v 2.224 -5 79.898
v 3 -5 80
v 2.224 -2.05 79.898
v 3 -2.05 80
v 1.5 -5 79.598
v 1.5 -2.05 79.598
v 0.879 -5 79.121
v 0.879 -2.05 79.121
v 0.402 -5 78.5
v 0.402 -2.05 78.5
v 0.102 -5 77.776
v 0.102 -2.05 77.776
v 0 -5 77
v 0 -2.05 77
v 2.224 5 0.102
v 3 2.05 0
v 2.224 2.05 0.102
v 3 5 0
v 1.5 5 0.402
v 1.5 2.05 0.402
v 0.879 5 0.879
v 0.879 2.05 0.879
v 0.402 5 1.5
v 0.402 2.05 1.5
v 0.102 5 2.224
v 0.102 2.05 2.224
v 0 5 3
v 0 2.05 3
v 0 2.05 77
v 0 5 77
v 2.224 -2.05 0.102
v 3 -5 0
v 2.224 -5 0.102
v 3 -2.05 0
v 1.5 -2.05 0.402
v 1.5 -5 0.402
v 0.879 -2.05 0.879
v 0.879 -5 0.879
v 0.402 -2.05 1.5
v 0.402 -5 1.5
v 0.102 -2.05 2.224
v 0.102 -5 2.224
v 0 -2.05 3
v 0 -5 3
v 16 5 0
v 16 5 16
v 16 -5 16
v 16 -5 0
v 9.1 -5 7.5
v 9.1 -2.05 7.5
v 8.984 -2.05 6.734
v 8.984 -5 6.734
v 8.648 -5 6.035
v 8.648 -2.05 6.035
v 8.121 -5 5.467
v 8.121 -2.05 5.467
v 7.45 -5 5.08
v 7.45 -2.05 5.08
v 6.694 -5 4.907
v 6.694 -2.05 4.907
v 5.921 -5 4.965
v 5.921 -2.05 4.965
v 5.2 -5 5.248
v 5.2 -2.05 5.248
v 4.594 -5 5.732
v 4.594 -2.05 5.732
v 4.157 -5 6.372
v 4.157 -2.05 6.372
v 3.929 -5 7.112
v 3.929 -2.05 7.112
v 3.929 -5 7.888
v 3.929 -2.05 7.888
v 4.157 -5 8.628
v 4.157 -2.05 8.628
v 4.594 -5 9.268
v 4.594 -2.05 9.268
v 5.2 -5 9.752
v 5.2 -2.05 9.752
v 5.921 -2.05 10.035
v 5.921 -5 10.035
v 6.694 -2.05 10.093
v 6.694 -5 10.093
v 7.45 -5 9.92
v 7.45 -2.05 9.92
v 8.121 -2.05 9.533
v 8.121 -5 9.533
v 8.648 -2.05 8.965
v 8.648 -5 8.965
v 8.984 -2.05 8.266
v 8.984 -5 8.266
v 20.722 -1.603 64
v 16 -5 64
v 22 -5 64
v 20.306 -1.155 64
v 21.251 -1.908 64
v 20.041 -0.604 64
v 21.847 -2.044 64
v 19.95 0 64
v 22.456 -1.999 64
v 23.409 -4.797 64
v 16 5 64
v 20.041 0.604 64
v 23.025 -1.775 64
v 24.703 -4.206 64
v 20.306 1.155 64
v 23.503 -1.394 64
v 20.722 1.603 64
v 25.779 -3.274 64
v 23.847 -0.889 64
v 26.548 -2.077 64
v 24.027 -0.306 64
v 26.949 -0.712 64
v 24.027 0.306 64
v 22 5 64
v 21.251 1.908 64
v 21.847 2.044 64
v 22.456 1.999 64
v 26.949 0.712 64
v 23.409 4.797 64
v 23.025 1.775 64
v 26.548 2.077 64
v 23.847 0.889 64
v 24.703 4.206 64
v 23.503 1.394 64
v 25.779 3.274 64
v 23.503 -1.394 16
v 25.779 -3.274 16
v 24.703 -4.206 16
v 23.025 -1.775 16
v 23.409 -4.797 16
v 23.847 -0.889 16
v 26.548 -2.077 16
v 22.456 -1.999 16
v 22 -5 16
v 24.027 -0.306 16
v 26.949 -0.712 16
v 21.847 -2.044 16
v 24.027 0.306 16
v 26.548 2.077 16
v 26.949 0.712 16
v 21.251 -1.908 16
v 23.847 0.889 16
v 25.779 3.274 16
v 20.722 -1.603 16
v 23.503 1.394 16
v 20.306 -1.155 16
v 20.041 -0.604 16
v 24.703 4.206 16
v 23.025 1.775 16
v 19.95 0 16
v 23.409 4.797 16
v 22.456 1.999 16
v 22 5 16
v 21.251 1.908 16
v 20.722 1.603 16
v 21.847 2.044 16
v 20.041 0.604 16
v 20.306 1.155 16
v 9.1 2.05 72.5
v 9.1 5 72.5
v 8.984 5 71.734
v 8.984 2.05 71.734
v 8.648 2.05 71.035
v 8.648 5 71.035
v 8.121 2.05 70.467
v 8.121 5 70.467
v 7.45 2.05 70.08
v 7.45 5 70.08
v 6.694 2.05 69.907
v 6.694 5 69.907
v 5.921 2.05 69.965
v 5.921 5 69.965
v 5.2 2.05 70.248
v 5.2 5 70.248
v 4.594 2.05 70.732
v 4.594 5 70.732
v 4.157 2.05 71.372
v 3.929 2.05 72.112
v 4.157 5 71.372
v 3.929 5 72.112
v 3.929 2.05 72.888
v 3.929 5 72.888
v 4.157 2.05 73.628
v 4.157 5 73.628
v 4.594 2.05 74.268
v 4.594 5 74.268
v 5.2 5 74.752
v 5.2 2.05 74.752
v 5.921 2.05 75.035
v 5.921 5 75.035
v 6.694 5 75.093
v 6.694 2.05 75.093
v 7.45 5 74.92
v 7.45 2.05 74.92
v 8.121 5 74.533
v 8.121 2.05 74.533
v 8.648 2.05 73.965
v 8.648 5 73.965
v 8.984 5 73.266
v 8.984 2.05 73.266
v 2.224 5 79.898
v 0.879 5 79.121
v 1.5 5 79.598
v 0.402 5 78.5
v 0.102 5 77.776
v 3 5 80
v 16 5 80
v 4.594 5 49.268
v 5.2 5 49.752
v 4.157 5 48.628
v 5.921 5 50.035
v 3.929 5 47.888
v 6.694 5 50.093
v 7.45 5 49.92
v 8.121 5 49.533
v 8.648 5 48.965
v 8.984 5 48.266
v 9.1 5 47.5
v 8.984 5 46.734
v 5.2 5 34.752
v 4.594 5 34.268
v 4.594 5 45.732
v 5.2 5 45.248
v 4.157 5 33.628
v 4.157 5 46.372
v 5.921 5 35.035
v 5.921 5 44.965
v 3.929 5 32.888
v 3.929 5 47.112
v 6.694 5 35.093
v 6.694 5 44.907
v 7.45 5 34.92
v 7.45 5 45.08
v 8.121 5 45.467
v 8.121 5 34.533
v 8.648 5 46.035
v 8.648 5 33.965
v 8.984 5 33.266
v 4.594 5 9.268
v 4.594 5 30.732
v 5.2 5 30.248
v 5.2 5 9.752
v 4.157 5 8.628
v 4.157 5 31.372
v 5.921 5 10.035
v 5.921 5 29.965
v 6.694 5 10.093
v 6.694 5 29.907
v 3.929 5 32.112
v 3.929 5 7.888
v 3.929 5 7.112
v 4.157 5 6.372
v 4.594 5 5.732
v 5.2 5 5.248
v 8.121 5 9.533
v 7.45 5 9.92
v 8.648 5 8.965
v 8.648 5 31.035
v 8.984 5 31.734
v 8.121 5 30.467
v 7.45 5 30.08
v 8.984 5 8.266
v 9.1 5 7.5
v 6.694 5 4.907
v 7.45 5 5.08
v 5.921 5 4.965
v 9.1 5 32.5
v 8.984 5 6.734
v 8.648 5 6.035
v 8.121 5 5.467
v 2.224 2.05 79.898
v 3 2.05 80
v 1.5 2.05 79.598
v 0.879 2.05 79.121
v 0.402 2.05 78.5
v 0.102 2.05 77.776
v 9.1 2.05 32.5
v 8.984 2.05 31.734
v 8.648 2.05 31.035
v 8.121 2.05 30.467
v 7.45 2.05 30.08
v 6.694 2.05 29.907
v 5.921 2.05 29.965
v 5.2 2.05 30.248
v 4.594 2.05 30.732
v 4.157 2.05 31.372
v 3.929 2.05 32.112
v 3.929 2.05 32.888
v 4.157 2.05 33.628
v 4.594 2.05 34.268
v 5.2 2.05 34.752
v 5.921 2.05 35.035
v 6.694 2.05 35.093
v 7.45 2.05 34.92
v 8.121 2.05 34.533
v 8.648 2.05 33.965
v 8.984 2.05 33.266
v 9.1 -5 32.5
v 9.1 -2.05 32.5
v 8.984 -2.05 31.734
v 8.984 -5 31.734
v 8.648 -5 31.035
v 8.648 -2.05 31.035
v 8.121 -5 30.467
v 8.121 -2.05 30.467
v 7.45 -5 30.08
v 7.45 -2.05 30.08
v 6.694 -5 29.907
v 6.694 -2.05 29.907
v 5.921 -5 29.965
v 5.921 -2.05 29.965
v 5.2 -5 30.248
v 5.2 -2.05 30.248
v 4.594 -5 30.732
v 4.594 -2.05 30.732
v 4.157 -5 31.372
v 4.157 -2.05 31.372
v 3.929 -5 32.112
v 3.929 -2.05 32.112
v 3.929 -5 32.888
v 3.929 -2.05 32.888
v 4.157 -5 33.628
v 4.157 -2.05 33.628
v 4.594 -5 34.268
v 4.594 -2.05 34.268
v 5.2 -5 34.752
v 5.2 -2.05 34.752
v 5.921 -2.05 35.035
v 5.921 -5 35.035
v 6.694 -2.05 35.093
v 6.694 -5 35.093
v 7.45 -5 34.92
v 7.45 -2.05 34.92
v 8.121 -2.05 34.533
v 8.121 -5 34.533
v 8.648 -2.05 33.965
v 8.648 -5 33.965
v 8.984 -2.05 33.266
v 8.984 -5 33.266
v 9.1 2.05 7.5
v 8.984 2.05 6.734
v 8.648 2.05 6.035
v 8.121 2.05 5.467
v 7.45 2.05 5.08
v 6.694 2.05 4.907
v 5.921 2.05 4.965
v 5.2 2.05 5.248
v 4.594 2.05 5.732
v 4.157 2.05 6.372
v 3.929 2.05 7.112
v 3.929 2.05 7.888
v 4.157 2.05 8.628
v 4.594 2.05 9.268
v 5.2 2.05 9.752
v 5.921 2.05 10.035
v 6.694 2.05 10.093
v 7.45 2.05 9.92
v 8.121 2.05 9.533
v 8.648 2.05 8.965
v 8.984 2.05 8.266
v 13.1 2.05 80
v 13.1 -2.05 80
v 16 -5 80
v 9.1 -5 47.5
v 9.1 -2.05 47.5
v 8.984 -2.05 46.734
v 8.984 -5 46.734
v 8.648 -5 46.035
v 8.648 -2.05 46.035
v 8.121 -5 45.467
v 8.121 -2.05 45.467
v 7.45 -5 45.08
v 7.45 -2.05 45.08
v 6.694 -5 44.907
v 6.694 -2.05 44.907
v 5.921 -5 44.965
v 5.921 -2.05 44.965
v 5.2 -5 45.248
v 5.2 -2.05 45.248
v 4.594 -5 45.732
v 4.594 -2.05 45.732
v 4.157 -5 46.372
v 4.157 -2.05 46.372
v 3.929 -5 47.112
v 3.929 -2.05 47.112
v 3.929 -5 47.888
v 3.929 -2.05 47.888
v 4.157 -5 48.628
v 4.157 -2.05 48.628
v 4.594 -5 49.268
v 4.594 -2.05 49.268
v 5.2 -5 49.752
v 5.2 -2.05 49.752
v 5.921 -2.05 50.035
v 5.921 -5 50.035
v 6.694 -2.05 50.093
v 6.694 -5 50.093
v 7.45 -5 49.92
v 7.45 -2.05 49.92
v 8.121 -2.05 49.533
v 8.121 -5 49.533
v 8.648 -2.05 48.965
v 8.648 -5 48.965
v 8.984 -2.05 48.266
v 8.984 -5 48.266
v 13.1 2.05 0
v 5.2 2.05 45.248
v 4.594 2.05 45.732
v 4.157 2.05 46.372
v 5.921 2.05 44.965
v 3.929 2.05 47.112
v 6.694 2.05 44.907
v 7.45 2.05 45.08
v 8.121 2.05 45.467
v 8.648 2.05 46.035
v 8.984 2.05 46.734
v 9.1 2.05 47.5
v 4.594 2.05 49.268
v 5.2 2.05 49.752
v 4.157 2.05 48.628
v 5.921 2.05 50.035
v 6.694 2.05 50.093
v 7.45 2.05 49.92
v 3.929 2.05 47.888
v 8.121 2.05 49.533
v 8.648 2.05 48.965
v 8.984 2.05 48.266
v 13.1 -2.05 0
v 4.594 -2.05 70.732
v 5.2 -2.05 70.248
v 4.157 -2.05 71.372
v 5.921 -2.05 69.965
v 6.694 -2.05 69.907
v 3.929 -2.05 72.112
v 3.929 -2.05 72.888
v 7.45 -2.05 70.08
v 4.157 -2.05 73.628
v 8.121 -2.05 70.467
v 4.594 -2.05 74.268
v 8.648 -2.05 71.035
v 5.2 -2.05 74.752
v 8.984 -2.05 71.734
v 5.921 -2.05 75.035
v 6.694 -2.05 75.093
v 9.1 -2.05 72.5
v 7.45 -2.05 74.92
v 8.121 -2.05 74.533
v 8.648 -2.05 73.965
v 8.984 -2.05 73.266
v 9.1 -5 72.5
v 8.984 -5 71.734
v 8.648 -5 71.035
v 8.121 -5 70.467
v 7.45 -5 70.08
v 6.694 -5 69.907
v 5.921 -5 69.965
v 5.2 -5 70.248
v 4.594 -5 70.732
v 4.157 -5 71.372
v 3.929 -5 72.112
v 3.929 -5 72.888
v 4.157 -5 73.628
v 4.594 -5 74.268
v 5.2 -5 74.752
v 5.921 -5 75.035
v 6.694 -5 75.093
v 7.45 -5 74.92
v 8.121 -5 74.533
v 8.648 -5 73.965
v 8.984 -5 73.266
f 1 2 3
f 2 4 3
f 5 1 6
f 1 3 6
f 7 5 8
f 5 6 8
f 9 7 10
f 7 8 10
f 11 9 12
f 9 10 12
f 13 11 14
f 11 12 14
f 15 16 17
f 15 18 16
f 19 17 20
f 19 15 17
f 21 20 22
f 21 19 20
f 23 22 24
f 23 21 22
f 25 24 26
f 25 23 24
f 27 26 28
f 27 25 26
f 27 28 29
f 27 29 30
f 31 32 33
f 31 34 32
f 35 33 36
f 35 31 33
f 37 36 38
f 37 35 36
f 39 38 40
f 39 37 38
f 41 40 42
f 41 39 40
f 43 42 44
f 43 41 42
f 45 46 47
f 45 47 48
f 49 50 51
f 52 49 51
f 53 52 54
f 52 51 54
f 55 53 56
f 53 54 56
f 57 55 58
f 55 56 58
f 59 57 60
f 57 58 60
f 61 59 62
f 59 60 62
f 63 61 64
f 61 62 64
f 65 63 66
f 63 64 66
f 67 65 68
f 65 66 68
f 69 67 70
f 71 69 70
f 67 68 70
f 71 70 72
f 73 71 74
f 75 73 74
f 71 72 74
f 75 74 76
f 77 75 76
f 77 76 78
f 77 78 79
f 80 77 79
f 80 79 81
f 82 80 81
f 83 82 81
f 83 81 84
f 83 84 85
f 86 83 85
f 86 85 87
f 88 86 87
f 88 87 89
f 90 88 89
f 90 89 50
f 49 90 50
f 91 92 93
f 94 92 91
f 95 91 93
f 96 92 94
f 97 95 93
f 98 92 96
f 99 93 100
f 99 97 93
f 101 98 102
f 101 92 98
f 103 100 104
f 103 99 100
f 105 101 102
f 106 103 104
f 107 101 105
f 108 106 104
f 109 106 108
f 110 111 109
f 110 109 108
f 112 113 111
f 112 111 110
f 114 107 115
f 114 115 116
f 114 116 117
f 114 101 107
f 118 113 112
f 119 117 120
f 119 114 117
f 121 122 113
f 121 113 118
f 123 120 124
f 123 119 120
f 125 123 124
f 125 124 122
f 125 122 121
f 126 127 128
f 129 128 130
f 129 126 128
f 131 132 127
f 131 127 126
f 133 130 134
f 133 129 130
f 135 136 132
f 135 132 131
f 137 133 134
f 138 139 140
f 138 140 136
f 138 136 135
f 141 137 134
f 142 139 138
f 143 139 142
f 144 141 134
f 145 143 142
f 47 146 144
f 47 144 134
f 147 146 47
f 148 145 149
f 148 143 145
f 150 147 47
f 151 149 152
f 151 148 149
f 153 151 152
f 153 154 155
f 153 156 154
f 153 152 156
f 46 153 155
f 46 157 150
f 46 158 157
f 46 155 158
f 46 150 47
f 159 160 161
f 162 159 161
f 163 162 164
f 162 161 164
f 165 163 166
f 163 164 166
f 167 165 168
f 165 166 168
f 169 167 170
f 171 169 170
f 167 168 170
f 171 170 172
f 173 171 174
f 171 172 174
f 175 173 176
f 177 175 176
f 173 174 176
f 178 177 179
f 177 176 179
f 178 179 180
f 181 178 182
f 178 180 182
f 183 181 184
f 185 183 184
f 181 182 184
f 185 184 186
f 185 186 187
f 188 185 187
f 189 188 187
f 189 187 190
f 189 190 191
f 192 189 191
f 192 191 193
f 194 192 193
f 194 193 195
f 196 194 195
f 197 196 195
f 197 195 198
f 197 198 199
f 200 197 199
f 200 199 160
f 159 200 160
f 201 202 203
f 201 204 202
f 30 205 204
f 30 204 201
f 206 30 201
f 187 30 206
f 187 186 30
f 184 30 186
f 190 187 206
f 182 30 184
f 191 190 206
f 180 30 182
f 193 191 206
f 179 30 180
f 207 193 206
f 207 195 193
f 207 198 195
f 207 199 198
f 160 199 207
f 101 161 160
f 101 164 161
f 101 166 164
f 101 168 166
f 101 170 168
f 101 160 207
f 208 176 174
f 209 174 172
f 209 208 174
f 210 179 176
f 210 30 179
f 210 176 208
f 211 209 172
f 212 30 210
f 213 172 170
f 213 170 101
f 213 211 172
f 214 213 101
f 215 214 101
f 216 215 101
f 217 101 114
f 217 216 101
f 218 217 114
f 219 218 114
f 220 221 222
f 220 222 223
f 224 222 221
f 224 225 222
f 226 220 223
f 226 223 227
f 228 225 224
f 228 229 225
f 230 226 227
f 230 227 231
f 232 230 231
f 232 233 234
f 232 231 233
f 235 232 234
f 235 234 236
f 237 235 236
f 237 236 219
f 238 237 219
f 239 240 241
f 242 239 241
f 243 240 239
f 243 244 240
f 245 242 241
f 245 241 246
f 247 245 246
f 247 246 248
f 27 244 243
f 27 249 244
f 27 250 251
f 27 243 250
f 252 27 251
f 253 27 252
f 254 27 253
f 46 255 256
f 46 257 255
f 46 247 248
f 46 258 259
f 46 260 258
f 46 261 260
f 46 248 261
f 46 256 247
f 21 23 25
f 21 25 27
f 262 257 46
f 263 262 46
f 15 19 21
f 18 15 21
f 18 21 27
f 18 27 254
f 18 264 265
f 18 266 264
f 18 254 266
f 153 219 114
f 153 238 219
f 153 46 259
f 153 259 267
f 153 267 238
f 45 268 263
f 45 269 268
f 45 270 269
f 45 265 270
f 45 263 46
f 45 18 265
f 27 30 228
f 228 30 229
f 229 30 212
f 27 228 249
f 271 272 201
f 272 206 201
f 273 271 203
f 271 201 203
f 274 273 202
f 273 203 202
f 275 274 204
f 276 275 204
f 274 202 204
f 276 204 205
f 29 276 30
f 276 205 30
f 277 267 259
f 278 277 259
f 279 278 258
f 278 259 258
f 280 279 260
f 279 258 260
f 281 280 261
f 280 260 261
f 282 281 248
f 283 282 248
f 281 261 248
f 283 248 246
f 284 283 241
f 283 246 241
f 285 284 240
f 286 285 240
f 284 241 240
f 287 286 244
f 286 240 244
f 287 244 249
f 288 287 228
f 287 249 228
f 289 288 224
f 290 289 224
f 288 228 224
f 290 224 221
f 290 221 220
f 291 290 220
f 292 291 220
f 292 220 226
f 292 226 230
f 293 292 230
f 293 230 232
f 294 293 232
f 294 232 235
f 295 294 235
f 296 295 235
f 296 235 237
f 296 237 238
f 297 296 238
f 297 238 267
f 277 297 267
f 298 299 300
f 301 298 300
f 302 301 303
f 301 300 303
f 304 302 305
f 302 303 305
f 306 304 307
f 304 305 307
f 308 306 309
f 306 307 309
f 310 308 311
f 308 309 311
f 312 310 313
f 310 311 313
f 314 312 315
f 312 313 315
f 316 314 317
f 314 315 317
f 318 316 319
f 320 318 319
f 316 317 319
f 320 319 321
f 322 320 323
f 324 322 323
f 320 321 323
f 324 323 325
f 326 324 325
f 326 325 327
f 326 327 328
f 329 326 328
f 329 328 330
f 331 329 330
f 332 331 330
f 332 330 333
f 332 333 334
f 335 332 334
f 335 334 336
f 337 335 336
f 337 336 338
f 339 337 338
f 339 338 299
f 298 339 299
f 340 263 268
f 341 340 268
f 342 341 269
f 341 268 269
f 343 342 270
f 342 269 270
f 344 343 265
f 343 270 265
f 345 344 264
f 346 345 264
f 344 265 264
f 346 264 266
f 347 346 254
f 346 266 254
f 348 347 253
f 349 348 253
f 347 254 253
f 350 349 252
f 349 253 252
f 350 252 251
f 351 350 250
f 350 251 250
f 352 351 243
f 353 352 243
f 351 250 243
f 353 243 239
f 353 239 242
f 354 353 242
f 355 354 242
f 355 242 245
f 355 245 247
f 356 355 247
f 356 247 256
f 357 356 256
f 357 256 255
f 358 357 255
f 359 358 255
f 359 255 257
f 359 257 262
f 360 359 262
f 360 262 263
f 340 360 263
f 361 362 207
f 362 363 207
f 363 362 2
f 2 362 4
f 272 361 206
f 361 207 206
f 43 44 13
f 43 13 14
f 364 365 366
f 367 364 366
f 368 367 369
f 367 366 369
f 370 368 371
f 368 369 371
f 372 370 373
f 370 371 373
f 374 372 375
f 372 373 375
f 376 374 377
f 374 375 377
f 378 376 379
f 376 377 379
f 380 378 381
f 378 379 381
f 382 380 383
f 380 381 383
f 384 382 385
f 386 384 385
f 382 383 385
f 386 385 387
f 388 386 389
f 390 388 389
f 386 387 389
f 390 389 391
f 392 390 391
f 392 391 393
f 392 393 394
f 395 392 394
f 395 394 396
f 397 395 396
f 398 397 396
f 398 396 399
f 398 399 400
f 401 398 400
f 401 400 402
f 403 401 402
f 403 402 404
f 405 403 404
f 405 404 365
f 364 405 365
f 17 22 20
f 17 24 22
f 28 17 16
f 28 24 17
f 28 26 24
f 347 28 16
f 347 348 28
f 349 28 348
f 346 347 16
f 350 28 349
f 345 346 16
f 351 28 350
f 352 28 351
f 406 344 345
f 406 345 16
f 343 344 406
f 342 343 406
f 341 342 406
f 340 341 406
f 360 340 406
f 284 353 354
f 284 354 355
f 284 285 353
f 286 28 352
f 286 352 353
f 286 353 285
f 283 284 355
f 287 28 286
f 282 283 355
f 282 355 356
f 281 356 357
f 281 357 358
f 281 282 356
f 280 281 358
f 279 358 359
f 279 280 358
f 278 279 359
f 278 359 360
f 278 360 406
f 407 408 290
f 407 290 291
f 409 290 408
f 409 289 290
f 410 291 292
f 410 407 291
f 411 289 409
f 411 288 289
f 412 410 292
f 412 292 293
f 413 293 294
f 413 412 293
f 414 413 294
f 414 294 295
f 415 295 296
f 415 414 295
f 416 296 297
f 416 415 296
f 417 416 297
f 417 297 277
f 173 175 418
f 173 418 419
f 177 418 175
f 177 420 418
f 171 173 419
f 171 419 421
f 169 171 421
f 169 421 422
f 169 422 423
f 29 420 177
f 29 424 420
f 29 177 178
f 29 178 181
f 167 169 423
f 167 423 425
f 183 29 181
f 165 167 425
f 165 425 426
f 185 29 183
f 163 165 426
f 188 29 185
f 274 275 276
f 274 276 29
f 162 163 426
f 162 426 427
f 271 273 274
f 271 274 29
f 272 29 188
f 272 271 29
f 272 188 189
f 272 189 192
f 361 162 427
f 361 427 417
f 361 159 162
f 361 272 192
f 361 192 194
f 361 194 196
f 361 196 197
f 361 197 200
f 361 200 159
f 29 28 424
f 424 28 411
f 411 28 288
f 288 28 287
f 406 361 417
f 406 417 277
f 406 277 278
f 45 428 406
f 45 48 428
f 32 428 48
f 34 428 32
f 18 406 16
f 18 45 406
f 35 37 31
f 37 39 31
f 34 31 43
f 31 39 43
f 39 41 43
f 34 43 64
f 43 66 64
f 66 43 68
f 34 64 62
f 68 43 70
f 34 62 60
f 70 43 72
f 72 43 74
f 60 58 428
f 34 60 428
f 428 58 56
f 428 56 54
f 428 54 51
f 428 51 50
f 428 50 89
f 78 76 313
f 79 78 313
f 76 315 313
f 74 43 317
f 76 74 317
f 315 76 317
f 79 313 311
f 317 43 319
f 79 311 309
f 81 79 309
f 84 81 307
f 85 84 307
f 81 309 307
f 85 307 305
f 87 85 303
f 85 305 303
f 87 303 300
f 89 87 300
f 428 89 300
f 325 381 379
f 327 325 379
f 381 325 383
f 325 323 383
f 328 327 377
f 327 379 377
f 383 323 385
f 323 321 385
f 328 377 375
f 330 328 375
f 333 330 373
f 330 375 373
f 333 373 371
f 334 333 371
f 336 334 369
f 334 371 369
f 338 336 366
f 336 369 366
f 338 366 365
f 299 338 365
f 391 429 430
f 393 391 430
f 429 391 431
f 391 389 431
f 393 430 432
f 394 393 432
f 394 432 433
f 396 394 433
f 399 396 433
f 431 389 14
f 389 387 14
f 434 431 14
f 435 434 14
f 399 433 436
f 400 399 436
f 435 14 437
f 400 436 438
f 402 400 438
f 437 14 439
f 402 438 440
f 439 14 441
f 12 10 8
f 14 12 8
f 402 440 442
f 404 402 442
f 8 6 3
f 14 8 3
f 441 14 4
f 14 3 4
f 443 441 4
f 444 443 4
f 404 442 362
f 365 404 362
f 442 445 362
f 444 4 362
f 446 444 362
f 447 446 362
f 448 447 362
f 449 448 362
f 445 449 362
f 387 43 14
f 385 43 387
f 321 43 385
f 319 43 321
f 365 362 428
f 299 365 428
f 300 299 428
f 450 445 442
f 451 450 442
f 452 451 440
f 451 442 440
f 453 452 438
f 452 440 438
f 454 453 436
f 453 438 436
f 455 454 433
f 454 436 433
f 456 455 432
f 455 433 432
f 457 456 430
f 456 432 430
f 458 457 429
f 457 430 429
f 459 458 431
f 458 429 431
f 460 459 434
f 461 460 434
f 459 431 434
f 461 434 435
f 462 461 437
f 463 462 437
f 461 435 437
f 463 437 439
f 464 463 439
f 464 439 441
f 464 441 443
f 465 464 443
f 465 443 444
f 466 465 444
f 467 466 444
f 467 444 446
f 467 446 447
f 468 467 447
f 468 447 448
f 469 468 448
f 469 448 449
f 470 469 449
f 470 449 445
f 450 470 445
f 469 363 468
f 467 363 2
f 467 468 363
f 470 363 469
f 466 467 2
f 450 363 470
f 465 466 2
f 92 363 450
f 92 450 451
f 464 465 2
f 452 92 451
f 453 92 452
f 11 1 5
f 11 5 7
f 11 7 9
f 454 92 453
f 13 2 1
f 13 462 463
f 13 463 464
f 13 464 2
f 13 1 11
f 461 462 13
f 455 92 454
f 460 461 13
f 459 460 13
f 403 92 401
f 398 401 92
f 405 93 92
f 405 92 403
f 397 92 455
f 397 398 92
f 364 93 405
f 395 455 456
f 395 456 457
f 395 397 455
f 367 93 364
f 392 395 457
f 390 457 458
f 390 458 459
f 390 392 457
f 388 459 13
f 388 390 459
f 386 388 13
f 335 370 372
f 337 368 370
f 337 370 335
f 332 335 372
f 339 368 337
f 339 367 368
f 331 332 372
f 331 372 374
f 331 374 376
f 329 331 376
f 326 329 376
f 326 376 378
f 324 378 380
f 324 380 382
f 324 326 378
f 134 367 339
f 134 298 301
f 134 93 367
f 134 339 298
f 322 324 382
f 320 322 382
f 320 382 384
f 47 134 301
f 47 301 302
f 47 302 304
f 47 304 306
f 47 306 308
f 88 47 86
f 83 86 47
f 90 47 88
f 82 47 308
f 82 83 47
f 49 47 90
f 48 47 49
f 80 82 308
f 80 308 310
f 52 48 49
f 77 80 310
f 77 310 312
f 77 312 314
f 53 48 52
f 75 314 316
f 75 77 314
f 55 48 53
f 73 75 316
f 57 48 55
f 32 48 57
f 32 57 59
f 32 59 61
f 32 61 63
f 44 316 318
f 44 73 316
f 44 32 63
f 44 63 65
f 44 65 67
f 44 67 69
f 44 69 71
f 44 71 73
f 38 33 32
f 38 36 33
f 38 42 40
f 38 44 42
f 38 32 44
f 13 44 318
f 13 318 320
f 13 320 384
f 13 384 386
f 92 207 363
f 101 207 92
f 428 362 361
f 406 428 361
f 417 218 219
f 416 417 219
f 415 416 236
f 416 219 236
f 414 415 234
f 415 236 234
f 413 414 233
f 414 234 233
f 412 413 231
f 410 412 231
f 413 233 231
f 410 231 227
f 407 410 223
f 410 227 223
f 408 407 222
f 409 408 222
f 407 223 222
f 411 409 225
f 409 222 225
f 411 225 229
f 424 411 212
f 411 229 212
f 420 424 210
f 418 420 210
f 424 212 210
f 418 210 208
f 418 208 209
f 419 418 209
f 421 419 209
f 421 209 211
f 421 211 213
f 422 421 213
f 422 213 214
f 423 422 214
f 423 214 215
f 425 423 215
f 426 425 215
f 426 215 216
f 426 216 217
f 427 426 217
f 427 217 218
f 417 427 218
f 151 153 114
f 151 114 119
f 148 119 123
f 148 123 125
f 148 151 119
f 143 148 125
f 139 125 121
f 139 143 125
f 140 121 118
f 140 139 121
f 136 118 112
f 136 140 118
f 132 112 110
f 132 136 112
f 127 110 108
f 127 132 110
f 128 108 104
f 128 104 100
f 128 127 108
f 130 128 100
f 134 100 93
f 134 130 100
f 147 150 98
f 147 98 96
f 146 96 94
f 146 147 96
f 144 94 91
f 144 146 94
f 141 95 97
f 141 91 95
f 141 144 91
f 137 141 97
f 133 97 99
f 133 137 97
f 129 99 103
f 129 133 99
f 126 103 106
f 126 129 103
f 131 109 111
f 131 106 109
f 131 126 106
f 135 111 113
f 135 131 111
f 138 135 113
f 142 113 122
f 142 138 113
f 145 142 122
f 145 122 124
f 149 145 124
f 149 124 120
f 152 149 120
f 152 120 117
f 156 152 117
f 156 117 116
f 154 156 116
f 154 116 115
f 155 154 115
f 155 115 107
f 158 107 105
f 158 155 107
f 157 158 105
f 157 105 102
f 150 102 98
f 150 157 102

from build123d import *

# Parameters (mm, degrees)
SKETCH_1_R          = 2.05
EXTRUDE_1_DEPTH     = 80
SKETCH_2_W          = 13.1
SKETCH_2_H          = 4.1
CUT_EXTRUDE_1_DEPTH = 95
SKETCH_4_R          = 2.6
CUT_EXTRUDE_2_DEPTH = 20
CUT_EXTRUDE_5_DEPTH = 20
FILLET_1_R          = 3


with BuildPart() as part:
    # 草图1 → 凸台-拉伸1 (new body)
    with BuildSketch(Plane.XY):
        with BuildLine():
            Line((0, 5), (22, 5))
            ThreePointArc((22, 5), (27, 0), (22, -5))
            Line((22, -5), (0, -5))
            Line((0, -5), (0, 5))
        make_face()
        with Locations(Location((22, 0, 0), (0, 0, 180))):
            Circle(SKETCH_1_R, mode=Mode.SUBTRACT)
    extrude(amount=EXTRUDE_1_DEPTH)

    # 草图2 → 切除-拉伸1 (cut)
    with BuildSketch(Plane.XY.offset(80)):
        with Locations((6.55, 0)):
            Rectangle(SKETCH_2_W, SKETCH_2_H)
    extrude(amount=-CUT_EXTRUDE_1_DEPTH, mode=Mode.SUBTRACT)

    # 草图4 → 切除-拉伸2 (cut)
    with BuildSketch(Plane(origin=(0, 5, 0), x_dir=(1, 0, 0), z_dir=(0, 1, 0))):
        with Locations((6.5, -32.5)):
            Circle(SKETCH_4_R)
        with Locations((6.5, -7.5)):
            Circle(SKETCH_4_R)
        with Locations((6.5, -72.5)):
            Circle(SKETCH_4_R)
        with Locations((6.5, -47.5)):
            Circle(SKETCH_4_R)
    extrude(amount=-CUT_EXTRUDE_2_DEPTH, mode=Mode.SUBTRACT)

    # 草图5 → 切除-拉伸5 (cut)
    with BuildSketch(Plane(origin=(0, 5, 0), x_dir=(1, 0, 0), z_dir=(0, 1, 0))):
        Polygon((22, 0), (32.496468361, 0), (32.496468361, -16), (16, -16), (16, 0), align=None)
        Polygon((16, -64), (32.496468361, -64), (32.496468361, -80), (22, -80), (16, -80), align=None)
    extrude(amount=-CUT_EXTRUDE_5_DEPTH, mode=Mode.SUBTRACT)

    # 圆角1
    fillet_1_edges = [part.edges().sort_by_distance(p)[0] for p in [
        (0, -3.525, 0),
        (0, -3.525, 80),
        (0, 3.525, 80),
        (0, 3.525, 0),
    ]]
    fillet(fillet_1_edges, radius=FILLET_1_R)


solid = part.part
